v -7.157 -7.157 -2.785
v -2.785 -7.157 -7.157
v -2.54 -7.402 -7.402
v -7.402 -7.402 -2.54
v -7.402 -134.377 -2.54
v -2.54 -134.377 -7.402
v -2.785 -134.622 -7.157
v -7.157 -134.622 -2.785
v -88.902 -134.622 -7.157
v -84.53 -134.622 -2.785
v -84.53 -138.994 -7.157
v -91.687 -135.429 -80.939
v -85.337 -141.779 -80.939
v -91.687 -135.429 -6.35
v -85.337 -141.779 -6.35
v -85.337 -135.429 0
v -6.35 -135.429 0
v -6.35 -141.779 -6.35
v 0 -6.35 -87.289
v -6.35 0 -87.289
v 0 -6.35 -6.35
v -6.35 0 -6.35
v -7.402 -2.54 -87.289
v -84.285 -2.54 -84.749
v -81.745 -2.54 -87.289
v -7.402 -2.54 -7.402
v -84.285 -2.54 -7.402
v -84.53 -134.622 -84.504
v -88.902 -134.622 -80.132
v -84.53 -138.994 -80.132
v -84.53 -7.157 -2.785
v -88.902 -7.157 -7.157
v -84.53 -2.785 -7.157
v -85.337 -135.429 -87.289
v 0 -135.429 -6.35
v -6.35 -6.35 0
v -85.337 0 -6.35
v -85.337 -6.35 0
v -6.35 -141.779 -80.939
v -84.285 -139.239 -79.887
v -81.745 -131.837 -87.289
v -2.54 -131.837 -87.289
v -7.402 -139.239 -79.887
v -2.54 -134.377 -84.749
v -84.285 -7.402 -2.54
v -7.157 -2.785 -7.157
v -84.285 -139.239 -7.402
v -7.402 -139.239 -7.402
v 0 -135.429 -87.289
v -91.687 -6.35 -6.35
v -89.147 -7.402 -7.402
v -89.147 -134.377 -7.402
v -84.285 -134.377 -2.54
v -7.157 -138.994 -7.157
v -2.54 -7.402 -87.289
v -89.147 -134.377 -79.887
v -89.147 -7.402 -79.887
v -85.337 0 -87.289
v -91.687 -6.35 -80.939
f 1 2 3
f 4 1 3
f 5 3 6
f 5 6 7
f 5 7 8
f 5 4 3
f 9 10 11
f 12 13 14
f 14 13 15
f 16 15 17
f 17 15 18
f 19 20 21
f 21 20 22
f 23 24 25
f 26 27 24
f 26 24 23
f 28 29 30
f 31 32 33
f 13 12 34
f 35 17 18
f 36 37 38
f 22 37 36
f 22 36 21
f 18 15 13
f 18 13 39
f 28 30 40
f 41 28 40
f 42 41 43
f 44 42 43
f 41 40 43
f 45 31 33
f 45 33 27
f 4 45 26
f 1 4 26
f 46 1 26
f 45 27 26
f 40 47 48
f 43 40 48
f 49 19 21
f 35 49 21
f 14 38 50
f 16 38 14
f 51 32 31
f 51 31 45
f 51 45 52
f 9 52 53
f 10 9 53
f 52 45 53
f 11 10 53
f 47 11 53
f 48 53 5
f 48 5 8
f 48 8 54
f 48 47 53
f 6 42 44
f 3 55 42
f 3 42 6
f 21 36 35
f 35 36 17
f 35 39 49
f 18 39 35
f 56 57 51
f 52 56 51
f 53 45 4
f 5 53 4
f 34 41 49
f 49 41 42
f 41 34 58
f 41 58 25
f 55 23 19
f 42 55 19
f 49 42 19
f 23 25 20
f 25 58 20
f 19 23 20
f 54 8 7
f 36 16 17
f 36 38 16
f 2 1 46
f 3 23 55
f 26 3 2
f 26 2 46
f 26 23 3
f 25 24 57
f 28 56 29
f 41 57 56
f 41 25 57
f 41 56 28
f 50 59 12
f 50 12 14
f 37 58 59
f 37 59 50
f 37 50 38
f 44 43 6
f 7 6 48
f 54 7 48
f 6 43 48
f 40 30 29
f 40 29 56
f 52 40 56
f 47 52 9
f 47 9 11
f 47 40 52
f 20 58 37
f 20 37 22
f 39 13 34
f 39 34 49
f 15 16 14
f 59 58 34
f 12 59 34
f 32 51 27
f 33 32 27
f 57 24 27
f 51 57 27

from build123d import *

# Parameters (mm, degrees)
F0_W     = 91.686919
F0_H     = 87.288838
F1_DEPTH = 141.779242
F2_SIZE  = 6.35
F3_T     = -2.54


with BuildPart() as f1:
    # F0 (on Front) → F1 (new body)
    with BuildSketch(Plane.XZ):
        with Locations((-45.843459, -43.644419)):
            Rectangle(F0_W, F0_H)
    extrude(amount=F1_DEPTH)

    # F2
    f2_edges = [f1.edges().sort_by_distance(p)[0] for p in [
        (-45.84346, -141.779242, 0),
        (-91.686919, -70.889621, 0),
        (-91.686919, -70.889621, -87.288838),
        (-91.686919, 0, -43.644419),
        (-91.686919, -141.779242, -43.644419),
        (0, -70.889621, 0),
        (-45.84346, 0, 0),
        (-45.84346, -141.779242, -87.288838),
        (0, -141.779242, -43.644419),
        (0, 0, -43.644419),
    ]]
    chamfer(f2_edges, length=F2_SIZE)

    # F3
    f3_openings = [f1.faces().sort_by_distance(p)[0] for p in [
        (-42.739325, -67.829256, -87.288838),
    ]]
    offset(amount=F3_T, openings=f3_openings)


solid = f1.part
